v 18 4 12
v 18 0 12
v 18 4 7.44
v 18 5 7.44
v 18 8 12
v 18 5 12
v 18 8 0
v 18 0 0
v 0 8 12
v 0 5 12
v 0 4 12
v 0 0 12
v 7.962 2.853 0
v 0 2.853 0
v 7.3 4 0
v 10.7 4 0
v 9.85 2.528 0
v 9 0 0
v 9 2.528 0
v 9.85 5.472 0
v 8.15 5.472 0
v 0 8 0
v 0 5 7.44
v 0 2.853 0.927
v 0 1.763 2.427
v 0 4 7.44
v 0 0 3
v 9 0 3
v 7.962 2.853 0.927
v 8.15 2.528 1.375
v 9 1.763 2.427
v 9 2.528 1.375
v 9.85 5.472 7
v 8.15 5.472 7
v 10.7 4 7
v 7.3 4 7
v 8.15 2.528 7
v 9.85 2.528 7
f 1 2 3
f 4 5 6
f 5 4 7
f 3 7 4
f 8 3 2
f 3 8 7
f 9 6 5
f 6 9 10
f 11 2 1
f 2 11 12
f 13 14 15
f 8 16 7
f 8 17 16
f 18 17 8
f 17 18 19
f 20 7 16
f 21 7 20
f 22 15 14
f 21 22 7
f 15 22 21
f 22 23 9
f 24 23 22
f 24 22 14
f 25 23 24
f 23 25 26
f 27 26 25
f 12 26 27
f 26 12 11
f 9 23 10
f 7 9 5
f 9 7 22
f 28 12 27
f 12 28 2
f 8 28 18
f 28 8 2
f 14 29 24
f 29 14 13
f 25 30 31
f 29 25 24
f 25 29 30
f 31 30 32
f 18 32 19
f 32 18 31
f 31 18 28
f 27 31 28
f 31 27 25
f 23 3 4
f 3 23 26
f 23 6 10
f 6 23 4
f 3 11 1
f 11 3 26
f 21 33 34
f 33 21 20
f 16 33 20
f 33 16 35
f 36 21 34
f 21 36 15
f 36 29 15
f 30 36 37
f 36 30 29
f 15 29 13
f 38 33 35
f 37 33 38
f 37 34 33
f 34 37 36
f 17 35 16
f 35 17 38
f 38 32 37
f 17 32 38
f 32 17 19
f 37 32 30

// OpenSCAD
// 独立摆锤台架 —— Part 3a: 摆杆夹头 rod_clamp.scad
// 夹 Ø6 碳纤/铝杆; 通过 3×M3 沉头孔固定在"金属舵机臂"(随舵机附带的
// 25T 花键铜/铝臂, 选带 2 个 M3 孔、孔距 10-16mm 的型号)上。

rod_d  = 6;       // 杆直径
h_cl   = 8;       // 夹头高(Y)
w      = 18;      // 宽(X)
t      = 12;      // 厚(Z, 压杆方向)

m3_d   = 3.4;     // M3 孔
screw_sp = 12;    // 两 M3 孔距(按你的舵机臂实测改)

difference() {
    cube([w, h_cl, t]);
    // 杆孔(贯穿 Z)
    rotate([0, 90, 0]) cylinder(d = rod_d, h = w, center = true);
    // 锁紧缝: 从顶面切到杆孔(M3 压缝)
    translate([0, h_cl / 2, t * 0.62]) cube([w, 1.0, t * 0.4]);
    // 两 M3 螺纹孔(固定到舵机臂)
    for (sx = [-1, 1])
        translate([sx * screw_sp / 2, 0, -1]) cylinder(d = m3_d, h = 3);
    // 侧向 M3 锁杆孔
    translate([w / 2, h_cl / 2, 0]) rotate([0, 0, 0]) cylinder(d = m3_d, h = t + 2, center = true);
}
